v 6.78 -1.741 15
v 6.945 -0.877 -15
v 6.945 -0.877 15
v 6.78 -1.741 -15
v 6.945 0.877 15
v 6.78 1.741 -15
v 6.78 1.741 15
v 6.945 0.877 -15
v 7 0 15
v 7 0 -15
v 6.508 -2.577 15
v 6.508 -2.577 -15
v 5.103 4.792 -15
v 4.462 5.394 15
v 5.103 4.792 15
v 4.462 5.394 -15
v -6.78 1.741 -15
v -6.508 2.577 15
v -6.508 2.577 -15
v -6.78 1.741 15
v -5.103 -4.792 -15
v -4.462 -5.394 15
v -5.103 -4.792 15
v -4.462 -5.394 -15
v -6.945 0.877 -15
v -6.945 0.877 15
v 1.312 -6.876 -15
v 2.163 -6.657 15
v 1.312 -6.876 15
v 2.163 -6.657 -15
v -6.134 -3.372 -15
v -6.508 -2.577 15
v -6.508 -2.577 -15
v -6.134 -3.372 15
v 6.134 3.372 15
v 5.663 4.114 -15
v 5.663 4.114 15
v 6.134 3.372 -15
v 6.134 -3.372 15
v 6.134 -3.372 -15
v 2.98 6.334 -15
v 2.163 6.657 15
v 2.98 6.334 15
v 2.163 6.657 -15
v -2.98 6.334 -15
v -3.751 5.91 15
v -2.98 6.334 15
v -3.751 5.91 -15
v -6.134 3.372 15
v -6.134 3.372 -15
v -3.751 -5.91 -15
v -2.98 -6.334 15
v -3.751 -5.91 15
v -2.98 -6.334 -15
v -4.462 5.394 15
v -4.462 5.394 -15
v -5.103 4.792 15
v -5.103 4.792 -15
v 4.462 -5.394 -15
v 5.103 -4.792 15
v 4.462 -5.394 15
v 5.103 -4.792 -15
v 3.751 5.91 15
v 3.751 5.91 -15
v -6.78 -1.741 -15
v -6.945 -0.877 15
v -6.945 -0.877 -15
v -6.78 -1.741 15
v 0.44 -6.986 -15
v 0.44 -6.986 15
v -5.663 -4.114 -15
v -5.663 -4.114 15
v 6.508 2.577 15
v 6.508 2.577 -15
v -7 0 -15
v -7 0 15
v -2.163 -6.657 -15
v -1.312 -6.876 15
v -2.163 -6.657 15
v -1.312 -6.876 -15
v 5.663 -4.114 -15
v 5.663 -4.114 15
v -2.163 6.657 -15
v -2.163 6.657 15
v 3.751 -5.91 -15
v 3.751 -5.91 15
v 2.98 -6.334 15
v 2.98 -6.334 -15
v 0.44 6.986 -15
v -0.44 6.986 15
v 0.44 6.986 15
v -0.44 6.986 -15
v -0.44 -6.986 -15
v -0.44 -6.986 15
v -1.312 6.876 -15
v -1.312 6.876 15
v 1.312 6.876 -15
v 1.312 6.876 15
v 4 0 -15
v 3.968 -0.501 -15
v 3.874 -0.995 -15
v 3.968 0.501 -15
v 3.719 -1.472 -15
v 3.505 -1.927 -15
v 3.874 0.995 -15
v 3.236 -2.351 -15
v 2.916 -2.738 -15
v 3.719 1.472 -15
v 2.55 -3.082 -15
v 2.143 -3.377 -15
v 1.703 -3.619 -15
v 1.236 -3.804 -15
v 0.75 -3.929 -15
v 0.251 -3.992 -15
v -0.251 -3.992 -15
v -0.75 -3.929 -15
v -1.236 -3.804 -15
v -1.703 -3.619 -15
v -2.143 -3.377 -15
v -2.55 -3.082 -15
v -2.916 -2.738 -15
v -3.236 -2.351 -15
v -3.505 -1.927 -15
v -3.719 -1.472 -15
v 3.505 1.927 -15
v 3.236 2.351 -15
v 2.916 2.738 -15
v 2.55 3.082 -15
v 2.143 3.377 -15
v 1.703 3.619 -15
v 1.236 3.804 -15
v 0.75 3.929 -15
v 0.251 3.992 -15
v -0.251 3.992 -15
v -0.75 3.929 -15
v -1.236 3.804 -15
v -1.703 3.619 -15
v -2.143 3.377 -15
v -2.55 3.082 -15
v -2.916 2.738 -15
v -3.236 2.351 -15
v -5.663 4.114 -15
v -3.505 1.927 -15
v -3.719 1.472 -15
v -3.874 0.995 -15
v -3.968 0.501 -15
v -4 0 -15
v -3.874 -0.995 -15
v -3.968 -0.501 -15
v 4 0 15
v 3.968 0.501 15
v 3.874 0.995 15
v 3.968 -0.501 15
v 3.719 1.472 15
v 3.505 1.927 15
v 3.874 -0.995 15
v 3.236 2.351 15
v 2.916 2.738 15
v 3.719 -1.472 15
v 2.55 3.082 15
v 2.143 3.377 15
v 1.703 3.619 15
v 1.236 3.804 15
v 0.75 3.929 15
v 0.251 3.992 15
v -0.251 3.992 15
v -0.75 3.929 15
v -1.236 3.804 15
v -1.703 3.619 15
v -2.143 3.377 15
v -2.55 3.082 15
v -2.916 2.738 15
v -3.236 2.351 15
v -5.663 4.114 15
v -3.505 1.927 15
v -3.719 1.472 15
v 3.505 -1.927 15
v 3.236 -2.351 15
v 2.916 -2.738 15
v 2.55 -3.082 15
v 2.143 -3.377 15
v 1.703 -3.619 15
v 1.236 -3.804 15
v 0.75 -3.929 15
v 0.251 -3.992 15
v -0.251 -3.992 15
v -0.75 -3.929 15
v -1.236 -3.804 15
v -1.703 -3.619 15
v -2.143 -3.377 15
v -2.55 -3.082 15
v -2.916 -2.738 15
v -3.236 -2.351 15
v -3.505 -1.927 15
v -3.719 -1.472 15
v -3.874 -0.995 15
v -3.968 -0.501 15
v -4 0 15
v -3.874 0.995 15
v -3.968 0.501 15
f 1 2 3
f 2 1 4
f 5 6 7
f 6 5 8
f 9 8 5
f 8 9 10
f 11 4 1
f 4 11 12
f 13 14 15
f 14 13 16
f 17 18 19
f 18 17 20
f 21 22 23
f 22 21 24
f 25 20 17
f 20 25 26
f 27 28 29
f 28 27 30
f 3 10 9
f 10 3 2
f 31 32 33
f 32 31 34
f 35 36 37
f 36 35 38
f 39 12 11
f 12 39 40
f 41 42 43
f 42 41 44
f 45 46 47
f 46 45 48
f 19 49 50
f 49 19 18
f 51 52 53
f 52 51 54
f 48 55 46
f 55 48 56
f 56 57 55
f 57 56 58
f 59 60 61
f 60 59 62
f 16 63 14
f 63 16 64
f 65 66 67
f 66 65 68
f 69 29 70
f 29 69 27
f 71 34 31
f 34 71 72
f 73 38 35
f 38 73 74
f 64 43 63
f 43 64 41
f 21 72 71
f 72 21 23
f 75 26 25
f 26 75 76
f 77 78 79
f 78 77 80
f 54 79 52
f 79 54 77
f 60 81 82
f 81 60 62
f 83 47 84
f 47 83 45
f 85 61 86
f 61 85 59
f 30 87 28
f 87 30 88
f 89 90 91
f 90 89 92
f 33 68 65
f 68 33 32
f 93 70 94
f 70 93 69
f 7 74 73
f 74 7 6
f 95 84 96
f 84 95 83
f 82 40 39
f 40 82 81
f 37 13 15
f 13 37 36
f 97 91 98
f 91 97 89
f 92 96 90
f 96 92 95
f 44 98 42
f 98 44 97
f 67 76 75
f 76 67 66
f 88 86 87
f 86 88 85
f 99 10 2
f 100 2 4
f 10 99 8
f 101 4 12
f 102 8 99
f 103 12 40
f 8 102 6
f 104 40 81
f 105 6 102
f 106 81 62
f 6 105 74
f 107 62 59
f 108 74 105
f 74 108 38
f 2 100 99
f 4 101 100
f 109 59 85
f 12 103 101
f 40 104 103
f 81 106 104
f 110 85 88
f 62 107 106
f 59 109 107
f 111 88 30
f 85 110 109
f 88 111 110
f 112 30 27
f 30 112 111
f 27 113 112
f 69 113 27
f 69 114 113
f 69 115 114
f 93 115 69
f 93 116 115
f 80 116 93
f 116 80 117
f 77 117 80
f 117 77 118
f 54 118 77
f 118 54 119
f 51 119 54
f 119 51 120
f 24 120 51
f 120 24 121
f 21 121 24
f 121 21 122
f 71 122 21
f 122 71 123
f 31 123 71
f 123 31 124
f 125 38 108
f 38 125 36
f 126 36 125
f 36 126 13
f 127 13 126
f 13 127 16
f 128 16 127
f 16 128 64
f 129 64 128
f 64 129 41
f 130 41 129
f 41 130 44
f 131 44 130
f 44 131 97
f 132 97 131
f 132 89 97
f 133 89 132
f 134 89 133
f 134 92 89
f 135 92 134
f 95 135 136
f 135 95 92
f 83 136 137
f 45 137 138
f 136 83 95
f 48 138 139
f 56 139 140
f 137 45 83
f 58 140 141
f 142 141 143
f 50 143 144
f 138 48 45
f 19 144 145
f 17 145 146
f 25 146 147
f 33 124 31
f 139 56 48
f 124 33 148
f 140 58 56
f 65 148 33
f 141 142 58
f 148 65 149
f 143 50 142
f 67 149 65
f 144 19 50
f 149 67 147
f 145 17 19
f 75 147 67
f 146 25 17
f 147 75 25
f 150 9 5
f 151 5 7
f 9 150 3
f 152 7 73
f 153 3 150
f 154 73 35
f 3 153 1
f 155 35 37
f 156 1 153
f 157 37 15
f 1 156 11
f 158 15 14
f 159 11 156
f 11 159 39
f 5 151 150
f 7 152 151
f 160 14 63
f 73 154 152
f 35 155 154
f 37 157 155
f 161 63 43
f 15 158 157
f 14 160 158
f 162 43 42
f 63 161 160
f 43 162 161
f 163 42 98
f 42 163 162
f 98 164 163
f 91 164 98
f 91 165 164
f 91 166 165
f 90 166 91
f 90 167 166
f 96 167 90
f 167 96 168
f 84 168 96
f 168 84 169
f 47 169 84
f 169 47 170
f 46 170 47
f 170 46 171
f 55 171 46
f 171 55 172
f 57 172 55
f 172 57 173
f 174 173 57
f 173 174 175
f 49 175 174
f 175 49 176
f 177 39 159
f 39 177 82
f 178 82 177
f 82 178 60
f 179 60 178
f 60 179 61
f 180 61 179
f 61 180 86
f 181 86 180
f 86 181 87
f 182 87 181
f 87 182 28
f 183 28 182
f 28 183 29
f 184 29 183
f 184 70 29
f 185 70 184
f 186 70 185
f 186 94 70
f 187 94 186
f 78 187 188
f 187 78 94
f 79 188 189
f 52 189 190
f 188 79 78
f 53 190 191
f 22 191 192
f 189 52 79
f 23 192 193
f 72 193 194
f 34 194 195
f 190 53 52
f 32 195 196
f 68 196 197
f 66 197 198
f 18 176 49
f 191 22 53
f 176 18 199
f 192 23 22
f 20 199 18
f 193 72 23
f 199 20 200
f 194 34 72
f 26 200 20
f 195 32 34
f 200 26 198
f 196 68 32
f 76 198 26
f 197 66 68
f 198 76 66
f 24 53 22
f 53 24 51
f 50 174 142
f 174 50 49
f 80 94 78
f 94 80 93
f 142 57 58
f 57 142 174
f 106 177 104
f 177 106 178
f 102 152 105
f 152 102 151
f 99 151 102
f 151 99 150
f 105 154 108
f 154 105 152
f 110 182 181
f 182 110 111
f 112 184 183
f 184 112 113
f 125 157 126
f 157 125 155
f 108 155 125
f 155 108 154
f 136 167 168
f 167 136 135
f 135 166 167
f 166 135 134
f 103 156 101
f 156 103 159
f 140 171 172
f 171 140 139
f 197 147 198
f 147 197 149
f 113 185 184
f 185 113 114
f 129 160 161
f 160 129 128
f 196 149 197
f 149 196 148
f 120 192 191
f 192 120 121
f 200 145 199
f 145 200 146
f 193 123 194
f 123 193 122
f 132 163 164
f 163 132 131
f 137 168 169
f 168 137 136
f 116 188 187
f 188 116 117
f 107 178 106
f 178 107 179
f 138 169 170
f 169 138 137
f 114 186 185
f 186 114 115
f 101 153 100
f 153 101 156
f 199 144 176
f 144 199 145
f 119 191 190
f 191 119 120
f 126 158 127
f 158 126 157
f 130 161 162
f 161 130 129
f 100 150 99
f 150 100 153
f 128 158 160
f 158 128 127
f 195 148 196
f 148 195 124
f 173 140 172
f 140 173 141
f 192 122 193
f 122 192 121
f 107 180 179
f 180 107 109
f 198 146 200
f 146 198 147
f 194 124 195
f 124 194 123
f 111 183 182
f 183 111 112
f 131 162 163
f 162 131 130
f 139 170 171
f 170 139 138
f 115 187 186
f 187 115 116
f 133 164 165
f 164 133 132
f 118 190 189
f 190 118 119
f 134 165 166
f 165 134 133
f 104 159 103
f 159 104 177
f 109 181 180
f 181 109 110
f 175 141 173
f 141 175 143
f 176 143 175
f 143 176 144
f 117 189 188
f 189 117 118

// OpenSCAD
$fn = 50;


difference() {
	union() {
		translate(v = [0, 0, -15.0000000000]) {
			cylinder(h = 30, r = 7.0000000000);
		}
	}
	union() {
		translate(v = [0, 0, -100.0000000000]) {
			cylinder(h = 200, r = 4.0000000000);
		}
	}
}
